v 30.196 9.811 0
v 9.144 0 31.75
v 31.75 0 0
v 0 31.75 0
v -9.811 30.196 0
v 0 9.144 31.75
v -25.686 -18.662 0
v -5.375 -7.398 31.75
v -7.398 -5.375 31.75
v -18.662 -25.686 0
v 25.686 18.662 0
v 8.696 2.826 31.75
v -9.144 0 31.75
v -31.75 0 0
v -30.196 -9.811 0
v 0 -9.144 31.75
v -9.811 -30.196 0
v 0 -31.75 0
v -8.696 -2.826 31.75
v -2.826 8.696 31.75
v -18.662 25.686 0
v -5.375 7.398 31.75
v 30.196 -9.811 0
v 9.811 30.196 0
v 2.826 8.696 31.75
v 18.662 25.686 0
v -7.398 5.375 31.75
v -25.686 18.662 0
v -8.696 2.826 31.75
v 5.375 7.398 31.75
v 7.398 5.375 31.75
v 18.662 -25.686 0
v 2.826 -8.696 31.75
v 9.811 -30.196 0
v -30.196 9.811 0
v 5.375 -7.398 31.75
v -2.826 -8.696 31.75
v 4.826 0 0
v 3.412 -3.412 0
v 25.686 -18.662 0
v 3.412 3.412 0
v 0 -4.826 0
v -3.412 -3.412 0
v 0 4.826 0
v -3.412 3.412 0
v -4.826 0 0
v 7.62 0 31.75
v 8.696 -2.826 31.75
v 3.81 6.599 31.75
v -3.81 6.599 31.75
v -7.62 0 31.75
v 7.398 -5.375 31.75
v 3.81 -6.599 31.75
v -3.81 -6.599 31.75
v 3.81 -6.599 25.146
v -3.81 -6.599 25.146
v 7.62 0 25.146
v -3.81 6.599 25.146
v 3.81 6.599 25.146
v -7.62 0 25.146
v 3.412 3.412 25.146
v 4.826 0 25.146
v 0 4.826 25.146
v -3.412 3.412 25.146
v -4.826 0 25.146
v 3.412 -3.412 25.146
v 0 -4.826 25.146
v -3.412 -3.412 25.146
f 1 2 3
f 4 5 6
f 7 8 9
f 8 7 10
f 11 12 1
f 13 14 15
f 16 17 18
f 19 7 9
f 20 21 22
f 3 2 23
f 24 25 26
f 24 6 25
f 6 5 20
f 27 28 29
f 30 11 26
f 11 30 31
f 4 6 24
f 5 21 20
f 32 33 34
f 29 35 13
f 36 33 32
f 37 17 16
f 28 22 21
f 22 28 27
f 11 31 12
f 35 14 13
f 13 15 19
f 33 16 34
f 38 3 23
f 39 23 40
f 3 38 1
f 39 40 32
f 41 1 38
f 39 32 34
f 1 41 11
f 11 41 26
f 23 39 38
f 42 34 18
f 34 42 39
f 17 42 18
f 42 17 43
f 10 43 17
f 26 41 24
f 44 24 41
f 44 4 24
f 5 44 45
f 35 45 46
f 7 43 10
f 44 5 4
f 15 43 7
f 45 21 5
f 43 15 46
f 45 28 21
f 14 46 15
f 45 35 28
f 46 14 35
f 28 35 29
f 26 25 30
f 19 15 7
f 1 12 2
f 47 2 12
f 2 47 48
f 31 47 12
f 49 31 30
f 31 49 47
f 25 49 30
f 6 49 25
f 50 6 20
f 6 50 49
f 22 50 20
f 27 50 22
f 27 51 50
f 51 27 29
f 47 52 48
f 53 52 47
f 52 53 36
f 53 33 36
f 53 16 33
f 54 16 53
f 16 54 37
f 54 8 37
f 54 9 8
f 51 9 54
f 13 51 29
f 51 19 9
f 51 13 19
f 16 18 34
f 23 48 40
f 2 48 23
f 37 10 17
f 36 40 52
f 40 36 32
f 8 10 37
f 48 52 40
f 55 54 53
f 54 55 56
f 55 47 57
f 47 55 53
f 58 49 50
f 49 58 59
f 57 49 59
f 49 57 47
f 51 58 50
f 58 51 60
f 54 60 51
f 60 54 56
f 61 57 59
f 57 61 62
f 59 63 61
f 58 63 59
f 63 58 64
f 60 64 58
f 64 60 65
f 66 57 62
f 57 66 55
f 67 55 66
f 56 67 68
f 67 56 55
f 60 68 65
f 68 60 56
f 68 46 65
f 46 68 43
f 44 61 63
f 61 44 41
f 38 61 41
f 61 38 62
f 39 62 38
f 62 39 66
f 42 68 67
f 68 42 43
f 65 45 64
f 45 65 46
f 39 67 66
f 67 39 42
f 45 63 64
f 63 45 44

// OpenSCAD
use <../../Vitamins/Pipe.scad>;

module PipeDrillAdapter(pipe=Spec_TubingOnePointOneTwoFive(), extension=1/2, wall=2/16,
                        nutHeight=0.26, nutDiameter=0.58, boltDiameter=0.35) {
  totalHeight = wall+nutHeight+extension;

  difference() {

    // Body
    cylinder(r=PipeOuterRadius(pipe, PipeClearanceSnug())+wall, h=totalHeight, $fn=PipeFn(pipe));

    // Pipe hole
    translate([0,0,wall+nutHeight])
    Pipe(pipe=pipe, length=totalHeight+0.2);

    // Nut
    translate([0,0,wall])
    cylinder(r=nutDiameter/2, h=nutHeight+0.1, $fn=6);

    // Bolt
    translate([0,0,-0.1])
    cylinder(r=boltDiameter/2, h=wall+0.2, $fn=PipeFn(pipe)/2);
  }
}

module PipeCone(nutHeight=0.26, nutDiameter=0.6, boltDiameter=0.38, major=2.5, id=0.32) {
  difference() {

    // Body
    cylinder(r1=major/2, r2=nutDiameter*.6, h=(major/2), $fn=20);

    // Nut
    translate([0,0,(major/2) - nutHeight])
    cylinder(r=nutDiameter/2, h=nutHeight+0.1, $fn=6);

    // Bolt
    translate([0,0,-0.1])
    cylinder(r=boltDiameter/2, h=major, $fn=8);
  }
}

scale([25.4, 25.4, 25.4])
PipeCone();
//PipeDrillAdapter();
